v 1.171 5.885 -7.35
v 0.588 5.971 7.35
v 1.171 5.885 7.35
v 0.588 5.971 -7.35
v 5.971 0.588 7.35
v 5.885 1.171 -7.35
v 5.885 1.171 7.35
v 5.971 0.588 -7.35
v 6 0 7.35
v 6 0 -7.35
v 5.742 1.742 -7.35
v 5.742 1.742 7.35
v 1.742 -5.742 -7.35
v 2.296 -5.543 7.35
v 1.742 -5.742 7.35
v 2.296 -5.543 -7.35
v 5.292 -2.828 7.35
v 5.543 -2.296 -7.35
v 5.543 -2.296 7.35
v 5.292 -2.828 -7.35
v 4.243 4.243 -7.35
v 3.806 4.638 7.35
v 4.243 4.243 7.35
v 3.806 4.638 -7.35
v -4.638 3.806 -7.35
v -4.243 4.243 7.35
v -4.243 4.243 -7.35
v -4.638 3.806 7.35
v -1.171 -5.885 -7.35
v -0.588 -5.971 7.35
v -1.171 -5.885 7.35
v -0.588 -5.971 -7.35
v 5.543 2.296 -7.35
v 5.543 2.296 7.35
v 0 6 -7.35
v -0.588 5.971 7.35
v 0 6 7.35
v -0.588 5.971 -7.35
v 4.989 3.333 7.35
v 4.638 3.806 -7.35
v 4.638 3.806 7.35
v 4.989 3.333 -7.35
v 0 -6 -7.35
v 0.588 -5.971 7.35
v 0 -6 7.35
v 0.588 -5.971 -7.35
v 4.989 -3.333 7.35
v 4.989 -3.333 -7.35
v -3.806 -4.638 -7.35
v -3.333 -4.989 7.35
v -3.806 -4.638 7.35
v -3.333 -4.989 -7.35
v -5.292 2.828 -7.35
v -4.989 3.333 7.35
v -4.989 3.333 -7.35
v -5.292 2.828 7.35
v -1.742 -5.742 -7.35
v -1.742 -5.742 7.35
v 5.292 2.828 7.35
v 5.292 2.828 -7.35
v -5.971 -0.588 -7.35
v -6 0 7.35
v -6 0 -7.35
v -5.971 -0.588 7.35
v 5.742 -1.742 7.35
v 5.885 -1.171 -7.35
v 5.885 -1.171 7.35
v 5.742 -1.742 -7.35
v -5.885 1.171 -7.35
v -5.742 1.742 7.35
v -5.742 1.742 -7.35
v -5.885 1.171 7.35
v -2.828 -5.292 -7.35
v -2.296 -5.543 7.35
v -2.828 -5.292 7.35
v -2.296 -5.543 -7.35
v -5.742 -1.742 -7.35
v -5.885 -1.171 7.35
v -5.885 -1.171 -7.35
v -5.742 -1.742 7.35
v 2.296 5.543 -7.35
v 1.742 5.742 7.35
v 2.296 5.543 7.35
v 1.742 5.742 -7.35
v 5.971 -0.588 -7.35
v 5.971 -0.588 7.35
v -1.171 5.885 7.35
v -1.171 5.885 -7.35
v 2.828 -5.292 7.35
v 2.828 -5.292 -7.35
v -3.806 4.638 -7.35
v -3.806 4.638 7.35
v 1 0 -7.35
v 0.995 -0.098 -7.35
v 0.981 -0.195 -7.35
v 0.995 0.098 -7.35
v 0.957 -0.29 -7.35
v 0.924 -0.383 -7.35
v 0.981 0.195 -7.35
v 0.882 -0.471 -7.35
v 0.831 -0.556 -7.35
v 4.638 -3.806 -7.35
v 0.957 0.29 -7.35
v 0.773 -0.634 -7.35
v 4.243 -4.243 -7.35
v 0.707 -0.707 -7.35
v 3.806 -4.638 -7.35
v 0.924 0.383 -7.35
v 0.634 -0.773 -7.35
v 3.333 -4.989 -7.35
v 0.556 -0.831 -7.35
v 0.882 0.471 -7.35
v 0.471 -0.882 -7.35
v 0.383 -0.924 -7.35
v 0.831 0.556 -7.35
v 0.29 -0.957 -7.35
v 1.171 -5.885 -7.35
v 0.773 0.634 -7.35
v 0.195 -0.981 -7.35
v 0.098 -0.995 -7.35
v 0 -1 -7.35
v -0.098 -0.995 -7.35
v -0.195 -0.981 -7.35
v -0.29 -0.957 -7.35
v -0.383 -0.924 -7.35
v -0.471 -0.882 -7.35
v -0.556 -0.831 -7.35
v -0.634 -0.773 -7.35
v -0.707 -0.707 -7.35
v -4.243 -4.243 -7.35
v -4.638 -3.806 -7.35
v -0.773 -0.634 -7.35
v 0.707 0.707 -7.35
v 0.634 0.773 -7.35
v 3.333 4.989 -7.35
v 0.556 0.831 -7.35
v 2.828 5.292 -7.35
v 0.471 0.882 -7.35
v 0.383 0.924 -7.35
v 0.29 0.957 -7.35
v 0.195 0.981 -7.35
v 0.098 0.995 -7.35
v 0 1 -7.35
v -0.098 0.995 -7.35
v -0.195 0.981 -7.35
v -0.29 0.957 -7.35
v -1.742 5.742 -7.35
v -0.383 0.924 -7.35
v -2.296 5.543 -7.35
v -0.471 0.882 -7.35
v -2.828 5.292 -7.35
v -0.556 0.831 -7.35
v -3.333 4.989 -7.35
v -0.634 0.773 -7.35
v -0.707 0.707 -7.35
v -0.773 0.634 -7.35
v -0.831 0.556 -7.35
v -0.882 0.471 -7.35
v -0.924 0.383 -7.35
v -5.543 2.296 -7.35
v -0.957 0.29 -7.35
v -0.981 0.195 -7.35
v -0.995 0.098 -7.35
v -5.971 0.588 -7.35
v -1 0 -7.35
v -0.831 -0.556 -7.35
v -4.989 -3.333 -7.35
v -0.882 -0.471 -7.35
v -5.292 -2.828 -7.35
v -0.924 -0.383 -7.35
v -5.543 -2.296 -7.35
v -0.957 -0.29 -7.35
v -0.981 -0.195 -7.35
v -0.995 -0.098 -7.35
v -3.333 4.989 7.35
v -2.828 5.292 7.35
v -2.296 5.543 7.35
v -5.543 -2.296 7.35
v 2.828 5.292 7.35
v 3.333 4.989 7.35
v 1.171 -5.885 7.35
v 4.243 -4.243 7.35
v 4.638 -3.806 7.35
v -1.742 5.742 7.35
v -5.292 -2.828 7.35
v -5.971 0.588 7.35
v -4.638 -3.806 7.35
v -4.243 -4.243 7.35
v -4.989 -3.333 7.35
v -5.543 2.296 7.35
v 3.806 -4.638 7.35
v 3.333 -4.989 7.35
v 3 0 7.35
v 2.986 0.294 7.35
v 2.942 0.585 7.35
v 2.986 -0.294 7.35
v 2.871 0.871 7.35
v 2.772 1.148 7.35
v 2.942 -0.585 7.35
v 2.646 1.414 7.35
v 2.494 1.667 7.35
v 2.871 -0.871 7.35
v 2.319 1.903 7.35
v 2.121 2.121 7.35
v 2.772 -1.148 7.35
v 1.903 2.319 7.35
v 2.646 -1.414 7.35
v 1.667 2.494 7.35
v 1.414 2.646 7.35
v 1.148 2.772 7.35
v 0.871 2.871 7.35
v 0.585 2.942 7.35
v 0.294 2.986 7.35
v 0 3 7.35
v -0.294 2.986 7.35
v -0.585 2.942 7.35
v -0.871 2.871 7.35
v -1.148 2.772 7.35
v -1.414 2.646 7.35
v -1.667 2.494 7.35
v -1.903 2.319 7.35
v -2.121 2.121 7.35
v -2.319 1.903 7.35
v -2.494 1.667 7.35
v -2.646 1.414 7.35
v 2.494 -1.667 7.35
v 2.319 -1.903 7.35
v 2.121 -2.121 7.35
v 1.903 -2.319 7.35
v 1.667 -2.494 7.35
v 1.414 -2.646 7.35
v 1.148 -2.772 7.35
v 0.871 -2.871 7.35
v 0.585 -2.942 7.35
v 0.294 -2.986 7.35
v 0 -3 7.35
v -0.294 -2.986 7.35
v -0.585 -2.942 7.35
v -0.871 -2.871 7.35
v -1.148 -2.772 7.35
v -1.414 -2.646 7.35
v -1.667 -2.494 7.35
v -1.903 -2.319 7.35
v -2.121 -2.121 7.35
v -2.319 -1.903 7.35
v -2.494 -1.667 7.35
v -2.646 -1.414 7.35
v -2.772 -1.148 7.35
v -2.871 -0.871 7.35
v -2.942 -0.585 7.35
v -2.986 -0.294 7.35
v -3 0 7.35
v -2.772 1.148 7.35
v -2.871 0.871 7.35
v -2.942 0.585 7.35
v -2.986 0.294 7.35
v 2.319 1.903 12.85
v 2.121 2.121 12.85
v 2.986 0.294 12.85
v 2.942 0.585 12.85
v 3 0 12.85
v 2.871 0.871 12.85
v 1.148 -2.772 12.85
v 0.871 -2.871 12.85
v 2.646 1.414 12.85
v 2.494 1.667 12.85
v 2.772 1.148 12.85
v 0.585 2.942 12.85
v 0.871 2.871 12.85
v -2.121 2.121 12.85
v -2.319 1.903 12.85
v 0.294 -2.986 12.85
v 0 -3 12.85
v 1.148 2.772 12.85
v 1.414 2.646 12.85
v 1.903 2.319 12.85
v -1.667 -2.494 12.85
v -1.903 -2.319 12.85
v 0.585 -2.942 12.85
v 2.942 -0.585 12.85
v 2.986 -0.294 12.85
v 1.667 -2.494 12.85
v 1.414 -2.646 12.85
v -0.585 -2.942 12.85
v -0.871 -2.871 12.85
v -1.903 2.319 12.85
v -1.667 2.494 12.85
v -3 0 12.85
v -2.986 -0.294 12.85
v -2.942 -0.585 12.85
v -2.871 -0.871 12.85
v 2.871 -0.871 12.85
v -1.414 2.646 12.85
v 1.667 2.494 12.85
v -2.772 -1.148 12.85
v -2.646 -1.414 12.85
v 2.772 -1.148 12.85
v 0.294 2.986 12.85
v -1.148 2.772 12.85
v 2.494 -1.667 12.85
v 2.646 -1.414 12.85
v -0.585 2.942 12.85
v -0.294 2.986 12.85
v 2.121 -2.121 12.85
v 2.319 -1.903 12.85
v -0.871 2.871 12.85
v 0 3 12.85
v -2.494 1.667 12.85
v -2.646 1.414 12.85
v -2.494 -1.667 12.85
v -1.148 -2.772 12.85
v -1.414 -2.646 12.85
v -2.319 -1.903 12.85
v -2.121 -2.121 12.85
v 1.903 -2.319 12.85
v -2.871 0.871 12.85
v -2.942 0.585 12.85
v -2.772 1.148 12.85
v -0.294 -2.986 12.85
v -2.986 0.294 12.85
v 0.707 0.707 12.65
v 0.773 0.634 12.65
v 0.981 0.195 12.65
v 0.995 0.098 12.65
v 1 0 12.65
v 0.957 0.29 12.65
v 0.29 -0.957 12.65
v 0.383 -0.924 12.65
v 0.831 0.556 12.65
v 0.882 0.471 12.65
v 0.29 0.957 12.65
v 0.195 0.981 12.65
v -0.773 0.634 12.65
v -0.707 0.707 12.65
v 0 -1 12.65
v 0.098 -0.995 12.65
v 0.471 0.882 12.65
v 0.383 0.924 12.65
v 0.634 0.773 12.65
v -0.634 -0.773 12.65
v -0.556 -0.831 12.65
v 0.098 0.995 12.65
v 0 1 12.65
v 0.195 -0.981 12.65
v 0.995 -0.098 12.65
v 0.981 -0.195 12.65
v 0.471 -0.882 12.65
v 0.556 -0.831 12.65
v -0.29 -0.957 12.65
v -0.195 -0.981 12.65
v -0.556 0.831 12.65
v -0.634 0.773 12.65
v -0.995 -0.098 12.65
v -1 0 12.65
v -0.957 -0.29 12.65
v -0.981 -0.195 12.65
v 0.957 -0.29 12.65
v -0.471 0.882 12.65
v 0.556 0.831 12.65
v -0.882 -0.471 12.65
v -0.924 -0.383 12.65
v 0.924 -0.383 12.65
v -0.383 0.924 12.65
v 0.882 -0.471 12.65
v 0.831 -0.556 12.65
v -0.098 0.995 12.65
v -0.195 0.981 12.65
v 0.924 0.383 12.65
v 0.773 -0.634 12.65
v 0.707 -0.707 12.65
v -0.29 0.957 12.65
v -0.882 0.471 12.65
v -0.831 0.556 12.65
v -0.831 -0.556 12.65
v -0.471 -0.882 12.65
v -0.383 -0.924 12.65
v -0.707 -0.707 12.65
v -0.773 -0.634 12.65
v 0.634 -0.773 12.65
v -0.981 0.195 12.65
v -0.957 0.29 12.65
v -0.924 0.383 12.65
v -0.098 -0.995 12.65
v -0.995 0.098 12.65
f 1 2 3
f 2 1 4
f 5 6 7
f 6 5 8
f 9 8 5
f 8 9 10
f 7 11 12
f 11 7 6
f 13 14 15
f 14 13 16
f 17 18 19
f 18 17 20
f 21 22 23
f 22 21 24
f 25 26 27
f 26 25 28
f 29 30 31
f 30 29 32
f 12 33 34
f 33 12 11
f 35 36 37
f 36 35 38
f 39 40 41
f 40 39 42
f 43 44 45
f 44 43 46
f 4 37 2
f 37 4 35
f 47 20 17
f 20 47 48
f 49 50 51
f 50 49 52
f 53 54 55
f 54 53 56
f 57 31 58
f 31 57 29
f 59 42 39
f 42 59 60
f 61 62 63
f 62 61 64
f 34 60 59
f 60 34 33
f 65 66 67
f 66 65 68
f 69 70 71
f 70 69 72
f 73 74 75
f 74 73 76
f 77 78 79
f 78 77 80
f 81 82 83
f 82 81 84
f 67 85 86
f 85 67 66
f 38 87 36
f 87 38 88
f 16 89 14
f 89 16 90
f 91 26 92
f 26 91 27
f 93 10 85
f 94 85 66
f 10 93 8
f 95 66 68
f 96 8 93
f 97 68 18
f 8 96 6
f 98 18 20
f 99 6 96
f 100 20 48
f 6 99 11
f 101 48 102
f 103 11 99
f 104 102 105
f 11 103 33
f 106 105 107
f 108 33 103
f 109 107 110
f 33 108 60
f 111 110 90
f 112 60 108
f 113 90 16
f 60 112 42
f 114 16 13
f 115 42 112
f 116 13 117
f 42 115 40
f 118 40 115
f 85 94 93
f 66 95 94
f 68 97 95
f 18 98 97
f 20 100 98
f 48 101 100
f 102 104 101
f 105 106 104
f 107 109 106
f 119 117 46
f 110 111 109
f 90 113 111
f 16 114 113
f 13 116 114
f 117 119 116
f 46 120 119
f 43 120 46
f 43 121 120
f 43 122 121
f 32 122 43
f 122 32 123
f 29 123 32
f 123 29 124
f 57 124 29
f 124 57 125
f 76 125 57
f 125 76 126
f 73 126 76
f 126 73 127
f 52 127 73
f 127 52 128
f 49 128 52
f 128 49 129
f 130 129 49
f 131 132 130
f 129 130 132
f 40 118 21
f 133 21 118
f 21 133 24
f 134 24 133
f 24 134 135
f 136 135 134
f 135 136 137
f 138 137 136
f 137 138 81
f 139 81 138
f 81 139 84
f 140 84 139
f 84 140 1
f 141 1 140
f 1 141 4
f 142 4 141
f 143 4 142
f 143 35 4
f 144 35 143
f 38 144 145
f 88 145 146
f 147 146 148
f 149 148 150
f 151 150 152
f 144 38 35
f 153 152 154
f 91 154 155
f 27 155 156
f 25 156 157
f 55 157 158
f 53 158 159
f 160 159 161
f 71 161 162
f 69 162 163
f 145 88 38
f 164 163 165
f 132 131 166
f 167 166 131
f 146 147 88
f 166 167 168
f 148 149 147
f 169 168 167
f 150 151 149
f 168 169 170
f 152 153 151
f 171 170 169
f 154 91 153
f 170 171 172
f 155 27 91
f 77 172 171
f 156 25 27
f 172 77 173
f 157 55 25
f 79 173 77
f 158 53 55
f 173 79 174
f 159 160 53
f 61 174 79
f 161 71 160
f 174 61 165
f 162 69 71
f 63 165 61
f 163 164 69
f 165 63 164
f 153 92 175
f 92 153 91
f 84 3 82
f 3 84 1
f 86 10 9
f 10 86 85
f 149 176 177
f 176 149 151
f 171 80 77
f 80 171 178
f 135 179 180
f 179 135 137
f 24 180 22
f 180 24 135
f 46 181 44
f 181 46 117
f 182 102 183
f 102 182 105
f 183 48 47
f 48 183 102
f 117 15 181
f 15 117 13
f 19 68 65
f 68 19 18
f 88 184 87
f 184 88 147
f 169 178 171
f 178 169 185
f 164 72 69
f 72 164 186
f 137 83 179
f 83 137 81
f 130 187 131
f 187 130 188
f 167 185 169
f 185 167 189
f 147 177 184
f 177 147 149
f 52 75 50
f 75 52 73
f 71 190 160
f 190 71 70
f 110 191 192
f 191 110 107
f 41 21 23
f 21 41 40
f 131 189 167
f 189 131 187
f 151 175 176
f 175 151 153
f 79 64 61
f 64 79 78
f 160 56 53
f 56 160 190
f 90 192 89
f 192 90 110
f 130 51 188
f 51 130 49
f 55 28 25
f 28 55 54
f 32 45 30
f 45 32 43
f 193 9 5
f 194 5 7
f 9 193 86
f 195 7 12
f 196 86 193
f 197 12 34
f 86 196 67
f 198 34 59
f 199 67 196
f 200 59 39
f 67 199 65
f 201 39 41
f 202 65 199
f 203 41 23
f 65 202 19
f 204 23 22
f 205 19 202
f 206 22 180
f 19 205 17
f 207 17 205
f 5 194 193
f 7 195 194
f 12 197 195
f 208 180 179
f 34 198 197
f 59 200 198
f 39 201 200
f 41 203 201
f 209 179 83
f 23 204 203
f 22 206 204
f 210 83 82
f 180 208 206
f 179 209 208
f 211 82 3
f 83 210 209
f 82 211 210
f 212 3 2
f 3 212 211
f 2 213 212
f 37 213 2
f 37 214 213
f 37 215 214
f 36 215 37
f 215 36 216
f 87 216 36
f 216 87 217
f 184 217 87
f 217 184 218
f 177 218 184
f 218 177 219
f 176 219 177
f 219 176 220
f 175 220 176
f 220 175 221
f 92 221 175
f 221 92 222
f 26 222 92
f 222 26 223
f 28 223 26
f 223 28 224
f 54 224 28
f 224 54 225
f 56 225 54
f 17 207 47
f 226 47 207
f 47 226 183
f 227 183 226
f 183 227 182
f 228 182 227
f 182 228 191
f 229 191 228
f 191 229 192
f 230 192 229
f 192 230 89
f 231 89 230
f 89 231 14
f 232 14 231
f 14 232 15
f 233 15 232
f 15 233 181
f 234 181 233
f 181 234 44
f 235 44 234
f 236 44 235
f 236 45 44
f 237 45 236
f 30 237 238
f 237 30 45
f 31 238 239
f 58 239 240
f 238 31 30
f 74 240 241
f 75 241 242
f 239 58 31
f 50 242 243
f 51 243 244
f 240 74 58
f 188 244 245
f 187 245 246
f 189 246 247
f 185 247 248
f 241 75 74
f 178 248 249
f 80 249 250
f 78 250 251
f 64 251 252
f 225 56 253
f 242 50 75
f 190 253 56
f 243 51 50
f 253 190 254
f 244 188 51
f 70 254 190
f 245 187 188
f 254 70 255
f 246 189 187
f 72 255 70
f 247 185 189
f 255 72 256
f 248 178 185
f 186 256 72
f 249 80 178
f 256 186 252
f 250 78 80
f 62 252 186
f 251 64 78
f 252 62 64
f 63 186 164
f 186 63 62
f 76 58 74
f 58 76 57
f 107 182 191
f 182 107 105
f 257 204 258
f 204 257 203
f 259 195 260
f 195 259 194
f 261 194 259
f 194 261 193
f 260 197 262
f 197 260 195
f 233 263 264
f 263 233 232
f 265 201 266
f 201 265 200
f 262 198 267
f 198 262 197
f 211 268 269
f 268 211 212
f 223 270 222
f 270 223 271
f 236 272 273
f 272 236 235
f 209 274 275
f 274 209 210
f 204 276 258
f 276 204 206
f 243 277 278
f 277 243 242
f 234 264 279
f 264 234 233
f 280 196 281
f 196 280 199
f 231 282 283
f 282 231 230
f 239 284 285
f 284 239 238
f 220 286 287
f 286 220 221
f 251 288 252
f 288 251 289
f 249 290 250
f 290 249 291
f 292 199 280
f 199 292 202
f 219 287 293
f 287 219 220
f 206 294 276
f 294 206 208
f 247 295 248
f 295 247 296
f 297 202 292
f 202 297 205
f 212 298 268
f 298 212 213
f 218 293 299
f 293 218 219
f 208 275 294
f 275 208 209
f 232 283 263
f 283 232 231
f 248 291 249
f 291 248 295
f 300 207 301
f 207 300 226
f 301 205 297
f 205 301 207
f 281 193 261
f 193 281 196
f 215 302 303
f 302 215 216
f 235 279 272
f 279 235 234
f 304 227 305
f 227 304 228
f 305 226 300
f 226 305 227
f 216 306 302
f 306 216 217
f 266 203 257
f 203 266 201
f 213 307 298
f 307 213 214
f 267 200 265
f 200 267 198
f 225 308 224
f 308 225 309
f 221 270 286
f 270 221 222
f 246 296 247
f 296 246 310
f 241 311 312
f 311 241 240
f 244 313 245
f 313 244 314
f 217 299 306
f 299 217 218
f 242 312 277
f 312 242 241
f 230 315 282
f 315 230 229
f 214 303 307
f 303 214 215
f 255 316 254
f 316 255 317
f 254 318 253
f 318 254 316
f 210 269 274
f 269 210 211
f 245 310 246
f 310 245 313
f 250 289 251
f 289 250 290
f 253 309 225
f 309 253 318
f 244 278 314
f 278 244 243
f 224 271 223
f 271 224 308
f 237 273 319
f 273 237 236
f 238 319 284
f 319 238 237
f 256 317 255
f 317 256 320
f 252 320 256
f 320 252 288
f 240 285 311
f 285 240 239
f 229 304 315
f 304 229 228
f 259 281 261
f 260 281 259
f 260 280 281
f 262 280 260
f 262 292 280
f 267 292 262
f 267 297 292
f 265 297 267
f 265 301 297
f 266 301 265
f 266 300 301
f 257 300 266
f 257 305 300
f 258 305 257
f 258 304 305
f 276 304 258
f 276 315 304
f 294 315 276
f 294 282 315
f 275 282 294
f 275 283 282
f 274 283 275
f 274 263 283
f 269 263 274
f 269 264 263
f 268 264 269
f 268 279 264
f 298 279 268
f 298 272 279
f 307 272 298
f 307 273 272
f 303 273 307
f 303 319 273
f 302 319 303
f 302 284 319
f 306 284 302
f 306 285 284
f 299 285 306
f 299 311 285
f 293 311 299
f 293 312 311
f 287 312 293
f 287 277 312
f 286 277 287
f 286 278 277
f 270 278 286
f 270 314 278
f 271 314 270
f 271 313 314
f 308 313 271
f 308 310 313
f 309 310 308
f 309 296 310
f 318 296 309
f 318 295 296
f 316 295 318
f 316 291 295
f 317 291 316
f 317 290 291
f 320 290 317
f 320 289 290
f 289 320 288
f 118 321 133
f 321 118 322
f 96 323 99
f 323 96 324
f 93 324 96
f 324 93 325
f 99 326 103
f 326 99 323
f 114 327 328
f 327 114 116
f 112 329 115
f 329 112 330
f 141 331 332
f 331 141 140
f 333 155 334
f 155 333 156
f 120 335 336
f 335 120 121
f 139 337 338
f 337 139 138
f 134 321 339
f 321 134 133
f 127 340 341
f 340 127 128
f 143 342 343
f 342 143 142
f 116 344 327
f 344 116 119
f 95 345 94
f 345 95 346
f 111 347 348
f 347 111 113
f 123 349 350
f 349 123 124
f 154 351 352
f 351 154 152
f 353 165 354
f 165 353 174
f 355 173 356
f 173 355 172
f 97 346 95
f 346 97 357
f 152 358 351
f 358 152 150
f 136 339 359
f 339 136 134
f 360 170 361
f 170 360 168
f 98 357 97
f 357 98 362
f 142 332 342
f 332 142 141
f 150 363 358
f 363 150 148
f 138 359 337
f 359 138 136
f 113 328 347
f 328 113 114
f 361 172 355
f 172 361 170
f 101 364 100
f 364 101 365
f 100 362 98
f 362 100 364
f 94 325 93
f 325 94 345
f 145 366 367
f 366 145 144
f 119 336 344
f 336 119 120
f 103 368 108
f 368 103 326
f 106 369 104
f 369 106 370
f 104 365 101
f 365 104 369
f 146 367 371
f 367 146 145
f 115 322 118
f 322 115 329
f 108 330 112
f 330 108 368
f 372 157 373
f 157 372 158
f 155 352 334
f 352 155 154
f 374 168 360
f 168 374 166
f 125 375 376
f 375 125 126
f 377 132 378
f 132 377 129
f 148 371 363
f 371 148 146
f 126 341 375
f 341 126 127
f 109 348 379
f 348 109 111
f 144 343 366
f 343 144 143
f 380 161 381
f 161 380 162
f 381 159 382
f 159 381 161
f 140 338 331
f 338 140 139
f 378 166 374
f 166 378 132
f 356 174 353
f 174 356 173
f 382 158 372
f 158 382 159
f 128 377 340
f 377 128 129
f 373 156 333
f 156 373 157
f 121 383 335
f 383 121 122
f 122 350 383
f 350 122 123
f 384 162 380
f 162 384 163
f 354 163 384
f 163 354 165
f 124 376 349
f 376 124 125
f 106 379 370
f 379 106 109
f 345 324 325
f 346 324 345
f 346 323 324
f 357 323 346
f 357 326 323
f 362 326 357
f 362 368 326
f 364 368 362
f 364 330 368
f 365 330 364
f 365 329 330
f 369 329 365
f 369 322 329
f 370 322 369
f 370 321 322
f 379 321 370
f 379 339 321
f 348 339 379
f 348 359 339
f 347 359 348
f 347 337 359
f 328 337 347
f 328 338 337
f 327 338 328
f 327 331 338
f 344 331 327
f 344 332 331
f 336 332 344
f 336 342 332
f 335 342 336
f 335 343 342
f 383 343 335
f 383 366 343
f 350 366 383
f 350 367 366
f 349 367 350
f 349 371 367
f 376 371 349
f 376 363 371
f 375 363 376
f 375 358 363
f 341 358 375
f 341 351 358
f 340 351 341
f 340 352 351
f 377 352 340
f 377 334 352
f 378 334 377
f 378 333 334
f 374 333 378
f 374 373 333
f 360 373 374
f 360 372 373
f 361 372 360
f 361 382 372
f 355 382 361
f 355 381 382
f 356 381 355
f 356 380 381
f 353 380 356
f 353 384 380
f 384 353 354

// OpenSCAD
module gear_motor() {
    difference() {
        union() {
            // Main body of the motor
            translate([0, 0, -7.35])
                cylinder(h=14.7, d=12, $fn=64);
            // Gear part
            translate([0, 0, 7.35])
                cylinder(h=5.5, d=6, $fn=64);
        }
        // Shaft hole
        translate([0, 0, -7.35])
            cylinder(h=20, d=2, $fn=64);
    }
}

gear_motor();
